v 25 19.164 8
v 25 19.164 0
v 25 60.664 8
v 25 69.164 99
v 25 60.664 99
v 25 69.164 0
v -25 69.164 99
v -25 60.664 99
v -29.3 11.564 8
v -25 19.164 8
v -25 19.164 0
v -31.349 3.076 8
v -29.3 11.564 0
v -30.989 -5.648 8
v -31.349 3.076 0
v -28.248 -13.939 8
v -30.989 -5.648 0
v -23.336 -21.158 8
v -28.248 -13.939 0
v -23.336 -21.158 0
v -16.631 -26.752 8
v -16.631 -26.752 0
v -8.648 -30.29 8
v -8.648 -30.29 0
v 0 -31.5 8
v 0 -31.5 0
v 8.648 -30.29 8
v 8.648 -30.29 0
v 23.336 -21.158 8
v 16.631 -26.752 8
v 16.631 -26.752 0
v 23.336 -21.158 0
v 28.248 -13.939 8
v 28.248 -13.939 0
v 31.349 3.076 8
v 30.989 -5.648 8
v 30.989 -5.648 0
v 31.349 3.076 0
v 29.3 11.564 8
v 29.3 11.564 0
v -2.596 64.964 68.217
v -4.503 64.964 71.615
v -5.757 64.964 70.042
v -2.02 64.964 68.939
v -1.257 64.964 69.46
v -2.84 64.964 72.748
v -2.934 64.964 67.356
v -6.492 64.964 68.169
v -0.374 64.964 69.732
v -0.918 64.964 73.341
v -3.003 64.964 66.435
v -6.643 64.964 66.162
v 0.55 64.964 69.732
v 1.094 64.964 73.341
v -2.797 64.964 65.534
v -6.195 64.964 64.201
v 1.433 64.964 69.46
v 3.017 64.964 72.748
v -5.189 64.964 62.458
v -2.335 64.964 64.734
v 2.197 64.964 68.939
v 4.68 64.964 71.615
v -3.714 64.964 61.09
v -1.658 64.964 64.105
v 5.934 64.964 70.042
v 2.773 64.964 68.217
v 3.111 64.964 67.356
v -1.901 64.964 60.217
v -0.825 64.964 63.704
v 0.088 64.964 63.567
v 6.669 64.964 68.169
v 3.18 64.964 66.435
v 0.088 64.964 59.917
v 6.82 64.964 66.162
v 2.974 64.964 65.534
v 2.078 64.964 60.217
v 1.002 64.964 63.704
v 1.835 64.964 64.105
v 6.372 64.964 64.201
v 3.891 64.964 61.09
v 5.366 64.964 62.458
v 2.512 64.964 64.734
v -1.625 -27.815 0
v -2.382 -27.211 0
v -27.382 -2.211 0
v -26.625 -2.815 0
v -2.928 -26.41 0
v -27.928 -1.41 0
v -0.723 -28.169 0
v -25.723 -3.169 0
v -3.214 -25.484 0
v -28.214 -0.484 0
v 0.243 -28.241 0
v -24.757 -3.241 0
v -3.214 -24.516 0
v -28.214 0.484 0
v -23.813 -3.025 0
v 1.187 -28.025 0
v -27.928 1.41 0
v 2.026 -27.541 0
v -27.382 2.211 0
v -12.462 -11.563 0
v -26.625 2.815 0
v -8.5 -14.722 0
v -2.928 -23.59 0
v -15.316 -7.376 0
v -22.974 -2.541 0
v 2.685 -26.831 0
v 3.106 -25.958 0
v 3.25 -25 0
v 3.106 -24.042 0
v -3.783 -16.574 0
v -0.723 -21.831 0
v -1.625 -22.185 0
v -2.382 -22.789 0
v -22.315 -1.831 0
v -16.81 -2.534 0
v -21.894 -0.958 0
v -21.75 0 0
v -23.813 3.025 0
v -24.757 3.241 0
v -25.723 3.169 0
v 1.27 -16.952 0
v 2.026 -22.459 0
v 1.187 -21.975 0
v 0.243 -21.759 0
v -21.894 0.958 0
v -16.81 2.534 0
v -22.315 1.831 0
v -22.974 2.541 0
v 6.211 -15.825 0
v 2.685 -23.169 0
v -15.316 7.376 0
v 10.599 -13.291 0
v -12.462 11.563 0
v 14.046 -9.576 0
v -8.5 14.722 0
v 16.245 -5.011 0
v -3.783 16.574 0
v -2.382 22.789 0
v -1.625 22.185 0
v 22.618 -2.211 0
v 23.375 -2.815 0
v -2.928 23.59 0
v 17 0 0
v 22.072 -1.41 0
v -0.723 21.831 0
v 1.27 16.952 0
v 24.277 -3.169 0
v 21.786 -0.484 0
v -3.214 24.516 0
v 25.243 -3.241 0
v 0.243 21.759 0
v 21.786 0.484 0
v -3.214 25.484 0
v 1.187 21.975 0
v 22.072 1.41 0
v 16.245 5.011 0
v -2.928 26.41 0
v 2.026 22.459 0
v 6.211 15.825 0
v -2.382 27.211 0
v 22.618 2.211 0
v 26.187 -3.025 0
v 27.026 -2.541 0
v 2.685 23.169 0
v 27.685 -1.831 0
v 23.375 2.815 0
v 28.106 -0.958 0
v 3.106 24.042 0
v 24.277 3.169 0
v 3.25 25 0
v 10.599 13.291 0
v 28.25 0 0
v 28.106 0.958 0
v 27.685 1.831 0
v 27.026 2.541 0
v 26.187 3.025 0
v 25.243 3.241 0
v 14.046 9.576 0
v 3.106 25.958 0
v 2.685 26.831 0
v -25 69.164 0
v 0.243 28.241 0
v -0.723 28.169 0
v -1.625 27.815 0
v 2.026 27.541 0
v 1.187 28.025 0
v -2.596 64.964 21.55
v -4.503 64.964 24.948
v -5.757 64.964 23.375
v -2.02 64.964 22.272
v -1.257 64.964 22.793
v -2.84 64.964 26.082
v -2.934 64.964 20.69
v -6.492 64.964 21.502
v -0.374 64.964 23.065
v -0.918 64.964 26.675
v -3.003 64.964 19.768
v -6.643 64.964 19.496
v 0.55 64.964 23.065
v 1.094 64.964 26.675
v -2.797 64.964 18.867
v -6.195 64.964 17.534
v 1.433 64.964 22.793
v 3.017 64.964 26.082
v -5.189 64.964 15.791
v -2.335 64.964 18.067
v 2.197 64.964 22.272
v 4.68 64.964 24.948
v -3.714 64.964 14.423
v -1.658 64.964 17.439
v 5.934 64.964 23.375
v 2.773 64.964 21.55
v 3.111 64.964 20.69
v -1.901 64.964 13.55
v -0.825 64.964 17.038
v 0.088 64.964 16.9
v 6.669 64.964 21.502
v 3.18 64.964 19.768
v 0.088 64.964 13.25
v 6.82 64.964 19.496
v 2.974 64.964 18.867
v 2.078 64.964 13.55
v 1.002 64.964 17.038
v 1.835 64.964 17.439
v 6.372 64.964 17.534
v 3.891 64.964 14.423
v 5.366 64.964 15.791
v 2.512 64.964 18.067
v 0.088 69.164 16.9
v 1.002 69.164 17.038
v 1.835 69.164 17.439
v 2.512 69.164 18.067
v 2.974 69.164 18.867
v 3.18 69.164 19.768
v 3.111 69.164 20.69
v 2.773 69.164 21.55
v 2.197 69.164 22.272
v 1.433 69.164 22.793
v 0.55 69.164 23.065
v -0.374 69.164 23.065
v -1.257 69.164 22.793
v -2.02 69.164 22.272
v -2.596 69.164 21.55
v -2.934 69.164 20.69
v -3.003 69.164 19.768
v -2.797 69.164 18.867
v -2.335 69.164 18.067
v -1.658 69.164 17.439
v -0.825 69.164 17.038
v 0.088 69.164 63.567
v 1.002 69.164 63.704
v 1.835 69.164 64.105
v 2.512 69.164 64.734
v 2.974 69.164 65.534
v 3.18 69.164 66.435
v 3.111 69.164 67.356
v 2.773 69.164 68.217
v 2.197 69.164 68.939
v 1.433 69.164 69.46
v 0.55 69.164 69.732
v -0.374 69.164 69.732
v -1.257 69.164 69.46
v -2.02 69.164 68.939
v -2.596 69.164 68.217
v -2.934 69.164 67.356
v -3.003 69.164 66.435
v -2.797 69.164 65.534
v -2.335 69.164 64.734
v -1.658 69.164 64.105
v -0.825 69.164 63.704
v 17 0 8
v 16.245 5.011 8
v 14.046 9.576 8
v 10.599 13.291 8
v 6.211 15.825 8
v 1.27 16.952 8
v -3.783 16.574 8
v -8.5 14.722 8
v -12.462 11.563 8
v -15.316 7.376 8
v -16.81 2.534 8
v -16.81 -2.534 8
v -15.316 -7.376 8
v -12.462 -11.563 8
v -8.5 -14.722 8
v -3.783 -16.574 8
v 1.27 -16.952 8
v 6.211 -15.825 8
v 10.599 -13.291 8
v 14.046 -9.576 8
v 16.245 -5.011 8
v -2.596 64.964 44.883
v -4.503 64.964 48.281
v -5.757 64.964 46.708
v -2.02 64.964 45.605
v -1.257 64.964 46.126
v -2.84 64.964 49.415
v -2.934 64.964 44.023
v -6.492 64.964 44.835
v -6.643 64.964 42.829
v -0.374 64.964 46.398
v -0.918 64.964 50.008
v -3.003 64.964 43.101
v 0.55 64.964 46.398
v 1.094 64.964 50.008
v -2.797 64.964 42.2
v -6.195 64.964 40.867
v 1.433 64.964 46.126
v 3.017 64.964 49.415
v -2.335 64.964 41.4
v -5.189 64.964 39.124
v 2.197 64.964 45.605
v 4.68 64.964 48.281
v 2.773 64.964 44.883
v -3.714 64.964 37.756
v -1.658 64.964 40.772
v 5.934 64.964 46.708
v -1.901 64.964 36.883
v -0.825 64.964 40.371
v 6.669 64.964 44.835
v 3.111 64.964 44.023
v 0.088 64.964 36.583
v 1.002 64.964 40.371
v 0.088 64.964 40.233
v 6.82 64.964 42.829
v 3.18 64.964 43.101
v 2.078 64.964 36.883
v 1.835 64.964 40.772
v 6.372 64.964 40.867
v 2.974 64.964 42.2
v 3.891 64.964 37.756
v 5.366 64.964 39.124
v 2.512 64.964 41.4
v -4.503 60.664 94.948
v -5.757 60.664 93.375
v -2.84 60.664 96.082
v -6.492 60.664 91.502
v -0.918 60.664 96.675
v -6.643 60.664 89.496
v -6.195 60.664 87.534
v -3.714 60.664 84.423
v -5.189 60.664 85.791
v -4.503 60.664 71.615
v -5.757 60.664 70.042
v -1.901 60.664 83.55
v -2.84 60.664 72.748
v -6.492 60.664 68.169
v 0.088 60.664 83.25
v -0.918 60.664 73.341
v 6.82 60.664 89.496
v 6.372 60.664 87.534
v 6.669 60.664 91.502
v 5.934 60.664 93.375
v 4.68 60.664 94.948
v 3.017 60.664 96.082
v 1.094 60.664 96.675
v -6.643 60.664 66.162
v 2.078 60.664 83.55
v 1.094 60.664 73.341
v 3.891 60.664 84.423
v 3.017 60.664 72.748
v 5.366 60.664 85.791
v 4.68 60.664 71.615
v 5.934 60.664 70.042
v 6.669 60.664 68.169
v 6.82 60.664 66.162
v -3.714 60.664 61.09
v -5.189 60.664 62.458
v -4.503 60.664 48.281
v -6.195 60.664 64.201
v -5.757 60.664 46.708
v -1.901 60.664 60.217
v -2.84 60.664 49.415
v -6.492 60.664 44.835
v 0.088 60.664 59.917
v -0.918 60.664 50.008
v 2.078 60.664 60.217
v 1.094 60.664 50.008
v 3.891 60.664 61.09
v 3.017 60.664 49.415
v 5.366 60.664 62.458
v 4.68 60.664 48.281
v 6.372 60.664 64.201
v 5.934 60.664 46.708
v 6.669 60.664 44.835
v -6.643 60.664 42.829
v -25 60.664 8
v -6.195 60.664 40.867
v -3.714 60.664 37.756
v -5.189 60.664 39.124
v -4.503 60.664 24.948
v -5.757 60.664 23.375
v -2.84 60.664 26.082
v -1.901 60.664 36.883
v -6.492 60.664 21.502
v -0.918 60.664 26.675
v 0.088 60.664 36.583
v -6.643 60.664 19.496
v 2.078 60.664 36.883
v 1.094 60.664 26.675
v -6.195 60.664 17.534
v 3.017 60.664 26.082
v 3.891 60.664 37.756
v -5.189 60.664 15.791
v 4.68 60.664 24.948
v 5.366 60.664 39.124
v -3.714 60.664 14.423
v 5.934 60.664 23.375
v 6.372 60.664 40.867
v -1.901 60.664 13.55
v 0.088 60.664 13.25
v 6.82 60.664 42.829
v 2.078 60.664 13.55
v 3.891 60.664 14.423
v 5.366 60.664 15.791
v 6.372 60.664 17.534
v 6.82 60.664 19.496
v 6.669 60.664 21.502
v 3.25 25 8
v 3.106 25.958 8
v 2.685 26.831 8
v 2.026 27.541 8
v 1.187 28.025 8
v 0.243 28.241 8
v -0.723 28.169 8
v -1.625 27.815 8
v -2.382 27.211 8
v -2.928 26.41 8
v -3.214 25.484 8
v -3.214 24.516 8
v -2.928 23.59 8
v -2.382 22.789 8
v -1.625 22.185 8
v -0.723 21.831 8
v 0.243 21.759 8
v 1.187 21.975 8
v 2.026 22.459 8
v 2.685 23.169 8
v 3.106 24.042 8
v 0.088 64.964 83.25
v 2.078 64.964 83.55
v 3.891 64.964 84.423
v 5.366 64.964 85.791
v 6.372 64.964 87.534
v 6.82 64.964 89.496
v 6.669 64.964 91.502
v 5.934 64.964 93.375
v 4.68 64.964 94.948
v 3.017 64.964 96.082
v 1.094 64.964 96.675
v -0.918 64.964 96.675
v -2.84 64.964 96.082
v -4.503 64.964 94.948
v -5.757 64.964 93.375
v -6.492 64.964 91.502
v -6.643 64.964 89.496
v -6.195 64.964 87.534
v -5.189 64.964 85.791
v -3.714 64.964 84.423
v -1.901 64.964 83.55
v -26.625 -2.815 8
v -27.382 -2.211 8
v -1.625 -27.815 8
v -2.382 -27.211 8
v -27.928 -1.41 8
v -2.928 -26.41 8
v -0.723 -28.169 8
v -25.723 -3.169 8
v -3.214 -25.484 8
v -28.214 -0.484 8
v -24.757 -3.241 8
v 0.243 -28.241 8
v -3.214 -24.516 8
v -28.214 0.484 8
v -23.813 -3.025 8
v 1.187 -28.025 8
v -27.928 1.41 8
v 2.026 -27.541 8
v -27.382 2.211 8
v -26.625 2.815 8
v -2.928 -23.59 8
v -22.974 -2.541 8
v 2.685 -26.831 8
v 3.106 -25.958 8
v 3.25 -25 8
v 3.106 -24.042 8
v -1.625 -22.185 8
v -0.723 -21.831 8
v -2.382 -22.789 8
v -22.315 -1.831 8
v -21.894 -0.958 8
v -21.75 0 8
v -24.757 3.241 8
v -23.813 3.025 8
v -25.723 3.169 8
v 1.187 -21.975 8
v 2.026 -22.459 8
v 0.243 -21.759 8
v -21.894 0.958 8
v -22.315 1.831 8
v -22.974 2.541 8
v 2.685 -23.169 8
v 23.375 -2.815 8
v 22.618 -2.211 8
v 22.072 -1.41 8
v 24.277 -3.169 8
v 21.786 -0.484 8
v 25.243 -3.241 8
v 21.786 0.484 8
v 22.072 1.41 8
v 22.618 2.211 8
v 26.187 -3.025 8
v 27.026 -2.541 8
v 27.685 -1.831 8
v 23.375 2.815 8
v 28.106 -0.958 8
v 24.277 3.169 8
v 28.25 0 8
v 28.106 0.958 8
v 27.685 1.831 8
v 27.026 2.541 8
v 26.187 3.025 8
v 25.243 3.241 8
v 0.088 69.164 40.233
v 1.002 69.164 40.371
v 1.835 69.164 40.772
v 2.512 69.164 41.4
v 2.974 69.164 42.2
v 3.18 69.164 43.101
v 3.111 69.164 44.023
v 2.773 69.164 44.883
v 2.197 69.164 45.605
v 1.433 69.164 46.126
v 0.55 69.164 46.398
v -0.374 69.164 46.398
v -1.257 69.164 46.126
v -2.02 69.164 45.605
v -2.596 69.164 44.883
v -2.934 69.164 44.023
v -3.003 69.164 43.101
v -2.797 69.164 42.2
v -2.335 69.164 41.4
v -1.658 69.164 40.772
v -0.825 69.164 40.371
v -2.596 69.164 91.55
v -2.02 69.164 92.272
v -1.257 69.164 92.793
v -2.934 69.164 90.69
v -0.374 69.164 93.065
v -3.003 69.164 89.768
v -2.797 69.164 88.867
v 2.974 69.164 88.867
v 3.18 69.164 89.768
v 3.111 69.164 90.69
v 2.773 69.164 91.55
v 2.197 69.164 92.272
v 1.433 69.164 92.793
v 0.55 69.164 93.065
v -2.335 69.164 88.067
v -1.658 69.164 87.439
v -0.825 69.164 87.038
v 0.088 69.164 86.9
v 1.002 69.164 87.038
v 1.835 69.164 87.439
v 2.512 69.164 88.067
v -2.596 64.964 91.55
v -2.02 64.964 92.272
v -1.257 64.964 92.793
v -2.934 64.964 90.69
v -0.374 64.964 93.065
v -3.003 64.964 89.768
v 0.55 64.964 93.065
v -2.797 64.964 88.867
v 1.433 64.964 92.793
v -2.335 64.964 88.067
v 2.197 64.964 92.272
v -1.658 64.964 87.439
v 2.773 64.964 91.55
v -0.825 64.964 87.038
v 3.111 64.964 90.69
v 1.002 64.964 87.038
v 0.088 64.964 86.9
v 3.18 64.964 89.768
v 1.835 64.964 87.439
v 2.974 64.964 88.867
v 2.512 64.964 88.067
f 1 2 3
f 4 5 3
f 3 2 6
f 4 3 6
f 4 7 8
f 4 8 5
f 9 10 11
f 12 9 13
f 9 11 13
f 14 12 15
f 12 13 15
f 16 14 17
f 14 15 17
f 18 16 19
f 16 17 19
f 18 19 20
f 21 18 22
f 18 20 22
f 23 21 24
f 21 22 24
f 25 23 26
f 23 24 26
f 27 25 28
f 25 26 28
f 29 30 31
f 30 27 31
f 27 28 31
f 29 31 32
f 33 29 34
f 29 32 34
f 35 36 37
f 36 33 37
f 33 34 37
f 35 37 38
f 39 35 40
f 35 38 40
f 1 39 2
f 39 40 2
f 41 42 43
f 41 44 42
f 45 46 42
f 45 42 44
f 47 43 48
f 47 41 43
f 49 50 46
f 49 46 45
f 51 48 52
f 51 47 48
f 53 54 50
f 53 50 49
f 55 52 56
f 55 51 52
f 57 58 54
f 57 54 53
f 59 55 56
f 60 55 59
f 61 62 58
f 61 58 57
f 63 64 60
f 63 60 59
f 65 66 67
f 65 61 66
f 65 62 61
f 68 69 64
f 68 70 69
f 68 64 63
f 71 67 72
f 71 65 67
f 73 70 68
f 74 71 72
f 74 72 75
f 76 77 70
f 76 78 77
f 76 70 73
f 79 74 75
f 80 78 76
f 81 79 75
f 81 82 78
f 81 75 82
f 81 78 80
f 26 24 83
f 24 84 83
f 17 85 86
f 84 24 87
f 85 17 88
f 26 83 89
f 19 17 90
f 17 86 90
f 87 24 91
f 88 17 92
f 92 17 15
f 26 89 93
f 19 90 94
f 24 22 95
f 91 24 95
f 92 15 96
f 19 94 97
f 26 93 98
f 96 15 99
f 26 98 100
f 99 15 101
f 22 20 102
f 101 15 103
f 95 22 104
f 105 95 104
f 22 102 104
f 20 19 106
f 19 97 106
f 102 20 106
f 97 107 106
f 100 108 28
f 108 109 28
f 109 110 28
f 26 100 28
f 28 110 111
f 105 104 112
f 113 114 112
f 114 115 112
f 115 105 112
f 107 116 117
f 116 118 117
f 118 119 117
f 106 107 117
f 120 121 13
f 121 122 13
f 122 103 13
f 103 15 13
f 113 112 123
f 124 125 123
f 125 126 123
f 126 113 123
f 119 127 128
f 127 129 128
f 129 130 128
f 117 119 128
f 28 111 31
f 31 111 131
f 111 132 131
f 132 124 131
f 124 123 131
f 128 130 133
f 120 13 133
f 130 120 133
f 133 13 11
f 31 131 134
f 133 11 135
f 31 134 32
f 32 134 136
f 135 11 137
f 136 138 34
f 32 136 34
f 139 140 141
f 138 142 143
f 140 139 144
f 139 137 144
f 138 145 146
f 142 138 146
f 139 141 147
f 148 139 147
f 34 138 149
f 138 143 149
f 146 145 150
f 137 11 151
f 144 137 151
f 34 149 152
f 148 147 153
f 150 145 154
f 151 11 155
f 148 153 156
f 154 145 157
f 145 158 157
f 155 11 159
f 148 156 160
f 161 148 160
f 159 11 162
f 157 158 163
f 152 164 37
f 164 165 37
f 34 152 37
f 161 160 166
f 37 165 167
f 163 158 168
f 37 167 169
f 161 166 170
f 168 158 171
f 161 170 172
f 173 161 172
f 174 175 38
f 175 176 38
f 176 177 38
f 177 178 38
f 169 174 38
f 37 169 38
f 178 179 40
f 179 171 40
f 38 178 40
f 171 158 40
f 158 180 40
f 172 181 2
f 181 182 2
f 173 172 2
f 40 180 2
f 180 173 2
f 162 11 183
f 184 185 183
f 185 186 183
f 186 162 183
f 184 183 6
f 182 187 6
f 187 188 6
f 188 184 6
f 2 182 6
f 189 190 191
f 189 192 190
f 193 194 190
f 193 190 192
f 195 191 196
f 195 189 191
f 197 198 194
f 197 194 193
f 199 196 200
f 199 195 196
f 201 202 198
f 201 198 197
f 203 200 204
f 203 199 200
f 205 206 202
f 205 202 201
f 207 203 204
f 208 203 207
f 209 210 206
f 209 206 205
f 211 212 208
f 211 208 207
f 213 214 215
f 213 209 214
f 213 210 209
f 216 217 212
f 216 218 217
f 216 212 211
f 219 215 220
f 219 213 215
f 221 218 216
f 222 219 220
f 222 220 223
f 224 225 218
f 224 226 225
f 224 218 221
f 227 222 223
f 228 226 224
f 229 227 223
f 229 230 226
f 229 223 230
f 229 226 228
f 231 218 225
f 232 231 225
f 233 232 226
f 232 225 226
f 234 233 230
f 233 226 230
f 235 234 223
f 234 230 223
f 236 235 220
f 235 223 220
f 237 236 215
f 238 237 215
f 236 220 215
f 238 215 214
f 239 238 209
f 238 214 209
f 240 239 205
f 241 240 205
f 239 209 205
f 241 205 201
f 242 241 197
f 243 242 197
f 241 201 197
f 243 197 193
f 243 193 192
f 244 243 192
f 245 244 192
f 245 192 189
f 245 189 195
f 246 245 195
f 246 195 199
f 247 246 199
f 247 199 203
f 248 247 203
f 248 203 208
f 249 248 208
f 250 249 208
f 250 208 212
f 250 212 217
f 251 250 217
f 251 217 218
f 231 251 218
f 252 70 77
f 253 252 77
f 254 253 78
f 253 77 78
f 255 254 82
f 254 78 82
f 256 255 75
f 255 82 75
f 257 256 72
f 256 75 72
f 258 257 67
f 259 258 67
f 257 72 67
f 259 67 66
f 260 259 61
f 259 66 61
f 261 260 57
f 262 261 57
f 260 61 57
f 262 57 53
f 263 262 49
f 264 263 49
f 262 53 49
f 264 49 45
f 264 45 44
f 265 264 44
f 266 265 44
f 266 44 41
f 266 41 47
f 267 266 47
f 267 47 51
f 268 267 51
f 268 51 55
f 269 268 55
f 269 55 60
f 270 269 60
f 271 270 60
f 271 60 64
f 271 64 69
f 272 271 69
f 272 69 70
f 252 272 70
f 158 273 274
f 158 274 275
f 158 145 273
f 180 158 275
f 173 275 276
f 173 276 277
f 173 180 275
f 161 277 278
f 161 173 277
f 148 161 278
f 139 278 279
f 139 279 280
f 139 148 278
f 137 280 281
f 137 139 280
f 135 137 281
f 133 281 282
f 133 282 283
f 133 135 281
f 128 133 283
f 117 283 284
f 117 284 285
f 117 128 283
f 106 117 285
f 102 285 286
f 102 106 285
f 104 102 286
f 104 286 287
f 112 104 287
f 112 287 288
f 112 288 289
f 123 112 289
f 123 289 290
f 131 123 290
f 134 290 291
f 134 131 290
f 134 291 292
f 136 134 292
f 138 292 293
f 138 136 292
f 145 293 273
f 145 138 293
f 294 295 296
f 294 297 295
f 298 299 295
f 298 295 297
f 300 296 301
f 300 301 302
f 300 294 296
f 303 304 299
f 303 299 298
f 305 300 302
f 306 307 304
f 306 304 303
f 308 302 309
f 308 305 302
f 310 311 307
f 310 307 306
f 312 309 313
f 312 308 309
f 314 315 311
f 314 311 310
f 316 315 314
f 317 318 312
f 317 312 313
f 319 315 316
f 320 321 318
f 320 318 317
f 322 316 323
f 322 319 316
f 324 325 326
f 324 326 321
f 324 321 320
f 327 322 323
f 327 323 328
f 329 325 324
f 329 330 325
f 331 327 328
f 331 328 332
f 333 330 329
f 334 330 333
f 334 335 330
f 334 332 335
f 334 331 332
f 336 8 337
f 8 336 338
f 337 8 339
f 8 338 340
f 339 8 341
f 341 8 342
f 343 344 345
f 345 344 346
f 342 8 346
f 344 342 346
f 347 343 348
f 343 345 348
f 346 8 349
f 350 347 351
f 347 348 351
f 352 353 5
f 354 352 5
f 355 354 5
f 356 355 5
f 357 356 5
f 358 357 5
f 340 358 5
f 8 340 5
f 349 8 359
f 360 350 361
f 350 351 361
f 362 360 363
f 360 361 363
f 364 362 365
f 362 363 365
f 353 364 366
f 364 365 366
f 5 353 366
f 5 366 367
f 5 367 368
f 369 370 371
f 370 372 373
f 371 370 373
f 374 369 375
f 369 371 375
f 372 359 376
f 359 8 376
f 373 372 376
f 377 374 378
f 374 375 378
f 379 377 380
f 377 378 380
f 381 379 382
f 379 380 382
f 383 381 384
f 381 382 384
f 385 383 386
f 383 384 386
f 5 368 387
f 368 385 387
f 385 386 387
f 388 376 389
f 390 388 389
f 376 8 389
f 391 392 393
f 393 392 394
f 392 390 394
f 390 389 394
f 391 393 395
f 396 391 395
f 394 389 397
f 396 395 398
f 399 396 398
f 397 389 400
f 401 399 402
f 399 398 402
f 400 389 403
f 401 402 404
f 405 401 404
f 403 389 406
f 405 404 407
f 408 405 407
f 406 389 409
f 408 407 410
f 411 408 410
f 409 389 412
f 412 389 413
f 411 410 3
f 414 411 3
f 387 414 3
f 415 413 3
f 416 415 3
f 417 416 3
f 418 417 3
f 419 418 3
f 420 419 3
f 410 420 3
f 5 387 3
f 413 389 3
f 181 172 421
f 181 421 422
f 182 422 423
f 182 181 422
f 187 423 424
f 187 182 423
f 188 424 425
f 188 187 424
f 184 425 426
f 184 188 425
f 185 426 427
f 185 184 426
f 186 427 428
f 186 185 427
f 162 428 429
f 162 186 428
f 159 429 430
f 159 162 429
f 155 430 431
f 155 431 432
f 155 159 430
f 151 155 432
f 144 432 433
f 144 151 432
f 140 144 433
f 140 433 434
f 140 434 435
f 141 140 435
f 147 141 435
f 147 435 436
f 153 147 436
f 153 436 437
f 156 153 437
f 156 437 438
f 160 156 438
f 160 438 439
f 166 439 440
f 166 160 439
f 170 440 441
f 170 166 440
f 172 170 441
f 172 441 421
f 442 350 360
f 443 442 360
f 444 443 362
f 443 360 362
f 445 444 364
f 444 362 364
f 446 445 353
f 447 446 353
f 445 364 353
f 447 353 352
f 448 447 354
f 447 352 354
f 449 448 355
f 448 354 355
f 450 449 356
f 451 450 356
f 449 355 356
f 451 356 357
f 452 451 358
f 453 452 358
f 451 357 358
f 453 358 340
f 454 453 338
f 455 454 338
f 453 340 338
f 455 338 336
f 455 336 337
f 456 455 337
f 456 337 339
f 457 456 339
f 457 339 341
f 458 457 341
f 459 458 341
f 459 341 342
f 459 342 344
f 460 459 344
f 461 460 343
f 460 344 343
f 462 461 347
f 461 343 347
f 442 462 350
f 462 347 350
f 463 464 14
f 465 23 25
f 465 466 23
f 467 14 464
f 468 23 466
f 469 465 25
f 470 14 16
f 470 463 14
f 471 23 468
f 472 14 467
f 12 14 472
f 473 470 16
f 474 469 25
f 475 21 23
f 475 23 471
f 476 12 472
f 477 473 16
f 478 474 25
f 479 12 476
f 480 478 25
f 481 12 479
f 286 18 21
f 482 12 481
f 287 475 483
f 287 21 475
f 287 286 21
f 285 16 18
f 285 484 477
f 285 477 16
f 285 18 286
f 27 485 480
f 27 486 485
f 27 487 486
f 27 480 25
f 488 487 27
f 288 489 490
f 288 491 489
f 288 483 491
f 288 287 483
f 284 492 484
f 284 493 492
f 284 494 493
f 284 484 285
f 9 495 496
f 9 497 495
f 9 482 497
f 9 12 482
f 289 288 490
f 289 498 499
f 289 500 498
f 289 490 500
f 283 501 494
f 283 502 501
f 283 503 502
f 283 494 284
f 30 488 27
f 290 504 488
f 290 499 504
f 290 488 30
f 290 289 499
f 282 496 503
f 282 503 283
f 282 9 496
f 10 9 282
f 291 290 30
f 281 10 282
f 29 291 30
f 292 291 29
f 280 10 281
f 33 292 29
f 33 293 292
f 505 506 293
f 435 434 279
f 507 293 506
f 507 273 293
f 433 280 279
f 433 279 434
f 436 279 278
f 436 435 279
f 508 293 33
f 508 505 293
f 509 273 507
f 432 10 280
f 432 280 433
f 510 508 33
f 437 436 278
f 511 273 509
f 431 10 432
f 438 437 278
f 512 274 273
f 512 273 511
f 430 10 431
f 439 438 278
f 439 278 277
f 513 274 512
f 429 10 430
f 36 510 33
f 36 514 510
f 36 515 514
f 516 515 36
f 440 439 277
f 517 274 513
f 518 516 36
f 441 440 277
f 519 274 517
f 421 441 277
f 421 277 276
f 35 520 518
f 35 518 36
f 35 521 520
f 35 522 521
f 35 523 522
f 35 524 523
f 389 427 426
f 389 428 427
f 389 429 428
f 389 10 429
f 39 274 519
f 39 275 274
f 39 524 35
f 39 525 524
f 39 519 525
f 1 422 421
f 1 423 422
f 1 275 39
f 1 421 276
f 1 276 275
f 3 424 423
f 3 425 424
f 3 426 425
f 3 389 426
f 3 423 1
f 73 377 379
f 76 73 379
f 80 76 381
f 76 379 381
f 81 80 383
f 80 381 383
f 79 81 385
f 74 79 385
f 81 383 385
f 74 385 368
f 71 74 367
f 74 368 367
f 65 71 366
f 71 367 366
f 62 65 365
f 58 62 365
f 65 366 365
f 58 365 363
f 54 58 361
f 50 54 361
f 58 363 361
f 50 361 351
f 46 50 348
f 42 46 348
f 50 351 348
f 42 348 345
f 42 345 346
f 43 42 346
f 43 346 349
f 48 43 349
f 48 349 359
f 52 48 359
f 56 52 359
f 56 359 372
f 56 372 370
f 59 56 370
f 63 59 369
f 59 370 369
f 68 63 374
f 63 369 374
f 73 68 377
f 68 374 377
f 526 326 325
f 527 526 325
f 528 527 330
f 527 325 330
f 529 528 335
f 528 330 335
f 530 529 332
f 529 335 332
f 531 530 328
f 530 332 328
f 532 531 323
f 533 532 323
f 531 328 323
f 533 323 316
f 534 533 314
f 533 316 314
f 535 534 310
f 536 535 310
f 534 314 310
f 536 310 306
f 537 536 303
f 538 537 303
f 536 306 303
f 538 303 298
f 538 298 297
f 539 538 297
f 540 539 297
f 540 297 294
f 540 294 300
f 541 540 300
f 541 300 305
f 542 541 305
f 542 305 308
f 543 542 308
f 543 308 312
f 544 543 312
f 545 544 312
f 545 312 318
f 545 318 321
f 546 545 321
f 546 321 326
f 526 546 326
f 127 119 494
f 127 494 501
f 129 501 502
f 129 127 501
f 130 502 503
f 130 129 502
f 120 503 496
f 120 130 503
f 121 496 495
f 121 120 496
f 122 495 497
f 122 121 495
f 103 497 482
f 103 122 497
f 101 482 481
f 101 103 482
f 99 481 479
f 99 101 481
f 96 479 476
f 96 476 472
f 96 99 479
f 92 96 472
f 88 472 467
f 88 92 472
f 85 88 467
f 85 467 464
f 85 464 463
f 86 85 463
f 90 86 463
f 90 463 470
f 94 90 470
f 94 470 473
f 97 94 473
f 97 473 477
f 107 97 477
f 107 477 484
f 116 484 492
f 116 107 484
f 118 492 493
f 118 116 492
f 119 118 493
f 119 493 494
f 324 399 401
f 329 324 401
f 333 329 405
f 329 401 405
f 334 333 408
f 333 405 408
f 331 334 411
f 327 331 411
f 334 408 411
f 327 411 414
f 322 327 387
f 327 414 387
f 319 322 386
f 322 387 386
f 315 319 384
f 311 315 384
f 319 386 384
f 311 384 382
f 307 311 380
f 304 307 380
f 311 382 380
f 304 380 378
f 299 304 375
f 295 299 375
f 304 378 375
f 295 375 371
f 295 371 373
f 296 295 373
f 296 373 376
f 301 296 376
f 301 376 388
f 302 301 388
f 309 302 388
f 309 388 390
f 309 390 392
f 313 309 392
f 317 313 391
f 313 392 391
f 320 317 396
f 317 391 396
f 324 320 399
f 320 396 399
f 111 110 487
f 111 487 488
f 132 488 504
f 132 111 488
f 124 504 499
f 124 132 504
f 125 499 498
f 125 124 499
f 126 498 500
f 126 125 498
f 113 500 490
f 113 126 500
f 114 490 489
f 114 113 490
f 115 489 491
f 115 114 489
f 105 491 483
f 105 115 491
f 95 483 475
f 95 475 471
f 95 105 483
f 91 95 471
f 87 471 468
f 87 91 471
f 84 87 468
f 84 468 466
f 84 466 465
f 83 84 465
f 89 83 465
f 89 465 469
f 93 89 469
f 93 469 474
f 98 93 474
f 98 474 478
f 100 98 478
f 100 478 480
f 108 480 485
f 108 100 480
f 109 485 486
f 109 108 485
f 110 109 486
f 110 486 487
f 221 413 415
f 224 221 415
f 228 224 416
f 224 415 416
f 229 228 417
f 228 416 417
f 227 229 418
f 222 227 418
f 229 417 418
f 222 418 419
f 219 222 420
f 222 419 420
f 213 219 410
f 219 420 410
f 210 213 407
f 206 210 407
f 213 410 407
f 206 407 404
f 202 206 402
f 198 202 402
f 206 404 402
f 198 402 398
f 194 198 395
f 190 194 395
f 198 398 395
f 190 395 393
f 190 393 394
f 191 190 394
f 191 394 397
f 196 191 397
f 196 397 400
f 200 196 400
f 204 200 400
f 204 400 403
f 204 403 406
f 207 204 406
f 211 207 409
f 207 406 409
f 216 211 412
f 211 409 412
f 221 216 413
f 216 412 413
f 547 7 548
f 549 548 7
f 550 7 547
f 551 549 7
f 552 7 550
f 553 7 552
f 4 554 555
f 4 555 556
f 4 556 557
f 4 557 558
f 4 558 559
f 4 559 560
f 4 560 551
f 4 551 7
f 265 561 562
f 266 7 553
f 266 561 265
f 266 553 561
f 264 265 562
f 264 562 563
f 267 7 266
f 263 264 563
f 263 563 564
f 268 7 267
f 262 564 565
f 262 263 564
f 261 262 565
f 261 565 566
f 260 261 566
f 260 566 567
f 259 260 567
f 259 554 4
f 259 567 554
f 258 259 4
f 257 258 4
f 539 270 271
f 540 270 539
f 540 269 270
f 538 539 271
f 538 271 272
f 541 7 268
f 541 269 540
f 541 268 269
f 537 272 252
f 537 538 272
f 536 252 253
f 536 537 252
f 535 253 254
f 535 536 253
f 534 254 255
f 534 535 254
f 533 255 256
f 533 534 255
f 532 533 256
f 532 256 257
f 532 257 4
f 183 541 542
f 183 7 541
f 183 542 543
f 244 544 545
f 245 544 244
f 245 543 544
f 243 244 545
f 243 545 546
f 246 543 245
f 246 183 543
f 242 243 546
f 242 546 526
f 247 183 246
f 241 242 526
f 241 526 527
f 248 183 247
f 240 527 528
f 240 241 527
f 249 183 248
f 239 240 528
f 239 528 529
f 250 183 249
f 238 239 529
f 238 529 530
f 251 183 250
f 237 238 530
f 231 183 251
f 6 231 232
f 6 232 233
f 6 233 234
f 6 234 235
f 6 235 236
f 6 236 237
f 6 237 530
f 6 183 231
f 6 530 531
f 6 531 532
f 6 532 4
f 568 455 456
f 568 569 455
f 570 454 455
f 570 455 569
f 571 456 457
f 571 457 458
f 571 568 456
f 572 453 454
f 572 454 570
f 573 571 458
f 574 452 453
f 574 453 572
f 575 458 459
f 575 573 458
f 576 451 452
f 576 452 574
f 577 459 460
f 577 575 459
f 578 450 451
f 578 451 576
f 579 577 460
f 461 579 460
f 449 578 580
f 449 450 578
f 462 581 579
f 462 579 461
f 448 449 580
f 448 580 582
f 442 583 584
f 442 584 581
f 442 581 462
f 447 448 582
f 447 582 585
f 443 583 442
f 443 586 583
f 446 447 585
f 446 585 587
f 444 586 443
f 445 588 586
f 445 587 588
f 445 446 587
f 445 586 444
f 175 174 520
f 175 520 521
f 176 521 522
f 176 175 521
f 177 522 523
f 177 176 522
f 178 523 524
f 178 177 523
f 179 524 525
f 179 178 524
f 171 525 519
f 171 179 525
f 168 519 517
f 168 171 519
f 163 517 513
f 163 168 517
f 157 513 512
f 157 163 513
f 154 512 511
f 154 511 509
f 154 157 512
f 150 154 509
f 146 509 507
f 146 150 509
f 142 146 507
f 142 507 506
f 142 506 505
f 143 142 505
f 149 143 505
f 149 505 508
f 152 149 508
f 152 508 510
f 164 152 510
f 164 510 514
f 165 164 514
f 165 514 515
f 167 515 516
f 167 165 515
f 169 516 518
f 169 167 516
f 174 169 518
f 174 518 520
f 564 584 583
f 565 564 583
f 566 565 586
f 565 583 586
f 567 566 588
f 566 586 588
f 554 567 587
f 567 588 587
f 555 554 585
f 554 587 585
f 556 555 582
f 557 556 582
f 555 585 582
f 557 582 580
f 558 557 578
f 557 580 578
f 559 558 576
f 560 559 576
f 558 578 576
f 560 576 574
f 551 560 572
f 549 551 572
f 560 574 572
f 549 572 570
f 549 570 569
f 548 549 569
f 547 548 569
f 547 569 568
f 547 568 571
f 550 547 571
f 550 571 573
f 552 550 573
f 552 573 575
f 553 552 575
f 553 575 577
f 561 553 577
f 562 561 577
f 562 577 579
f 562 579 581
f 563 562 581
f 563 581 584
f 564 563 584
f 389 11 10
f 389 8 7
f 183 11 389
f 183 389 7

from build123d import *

# Parameters (mm, degrees)
SKETCH_1_R          = 31.5
EXTRUDE_1_DEPTH     = 8
SKETCH_1_3_R        = 3.25
CUT_EXTRUDE_1_DEPTH = 8
SKETCH_1_4_R        = 17
CUT_EXTRUDE_2_DEPTH = 6
EXTRUDE_2_DEPTH     = 4
SKETCH_4_W          = 50
SKETCH_4_H          = 8.5
EXTRUDE_3_DEPTH     = 95
SKETCH_5_R          = 3.1
CUT_EXTRUDE_3_DEPTH = 10
SKETCH_5_3_R        = 6.75
SKETCH_5_3_R_2      = 3.1
CUT_EXTRUDE_4_DEPTH = 4.3
EXTRUDE_4_DEPTH     = 8
SKETCH_1_8_R        = 17
CUT_EXTRUDE_5_DEPTH = 8


with BuildPart() as part:
    # 草图1 → 凸台-拉伸1 (new body)
    with BuildSketch(Plane.XY):
        Circle(SKETCH_1_R)
    extrude(amount=EXTRUDE_1_DEPTH)

    # 草图1<3> → 切除-拉伸1 (cut)
    with BuildSketch(Plane.XY):
        with Locations((0, 25)):
            Circle(SKETCH_1_3_R)
        with Locations((-25, 0)):
            Circle(SKETCH_1_3_R)
        with Locations((25, 0)):
            Circle(SKETCH_1_3_R)
        with Locations((0, -25)):
            Circle(SKETCH_1_3_R)
    extrude(amount=CUT_EXTRUDE_1_DEPTH, mode=Mode.SUBTRACT)

    # 草图1<4> → 切除-拉伸2 (cut)
    with BuildSketch(Plane.XY):
        Circle(SKETCH_1_4_R)
    extrude(amount=CUT_EXTRUDE_2_DEPTH, mode=Mode.SUBTRACT)

    # 草图1<5> → 凸台-拉伸2 (add)
    with BuildSketch(Plane.XY):
        with BuildLine():
            Line((25, 69.163767897), (17.863752341, 69.163767897))
            Line((17.863752341, 69.163767897), (-25, 69.163767897))
            Line((-25, 69.163767897), (-25, 28.735067362))
            Line((-25, 28.735067362), (-25, 19.163767897))
            ThreePointArc((-25, 19.163767897), (0, 31.5), (25, 19.163767897))
            Line((25, 19.163767897), (25, 69.163767897))
        make_face()
    extrude(amount=EXTRUDE_2_DEPTH)

    # 草图4 → 凸台-拉伸3 (add)
    with BuildSketch(Plane.XY.offset(4)):
        with Locations((0, 64.913767897)):
            Rectangle(SKETCH_4_W, SKETCH_4_H)
    extrude(amount=EXTRUDE_3_DEPTH)

    # 草图5 → 切除-拉伸3 (cut)
    with BuildSketch(Plane.XZ.offset(-60.663767897)):
        with Locations((0.088398714, 90)):
            Circle(SKETCH_5_R)
        with Locations((0.088398714, 20)):
            Circle(SKETCH_5_R)
        with Locations((0.088398714, 43.333)):
            Circle(SKETCH_5_R)
        with Locations((0.088398714, 66.66667)):
            Circle(SKETCH_5_R)
    extrude(amount=-CUT_EXTRUDE_3_DEPTH, mode=Mode.SUBTRACT)

    # 草图5<3> → 切除-拉伸4 (cut)
    # profile 1 of 4: a face of its own
    with BuildSketch(Plane.XZ.offset(-60.663767897)):
        with Locations((0.088398714, 90)):
            Circle(SKETCH_5_3_R)
    # profile 2 of 4: a face of its own
    with BuildSketch(Plane.XZ.offset(-60.663767897)):
        with Locations((0.088398714, 20)):
            Circle(SKETCH_5_3_R)
        with Locations((0.088398714, 20)):
            Circle(SKETCH_5_3_R_2, mode=Mode.SUBTRACT)
    # profile 3 of 4: a face of its own
    with BuildSketch(Plane.XZ.offset(-60.663767897)):
        with Locations((0.088398714, 43.333)):
            Circle(SKETCH_5_3_R)
        with Locations((0.088398714, 43.333)):
            Circle(SKETCH_5_3_R_2, mode=Mode.SUBTRACT)
    # profile 4 of 4: a face of its own
    with BuildSketch(Plane.XZ.offset(-60.663767897)):
        with Locations((0.088398714, 66.66667)):
            Circle(SKETCH_5_3_R)
        with Locations((0.088398714, 66.66667)):
            Circle(SKETCH_5_3_R_2, mode=Mode.SUBTRACT)
    extrude(amount=-CUT_EXTRUDE_4_DEPTH, mode=Mode.SUBTRACT)

    # 草图1<7> → 凸台-拉伸4 (add)
    with BuildSketch(Plane.XY):
        with BuildLine():
            Line((25, 69.163767897), (17.863752341, 69.163767897))
            Line((17.863752341, 69.163767897), (-25, 69.163767897))
            Line((-25, 69.163767897), (-25, 28.735067362))
            Line((-25, 28.735067362), (-25, 19.163767897))
            ThreePointArc((-25, 19.163767897), (0, 31.5), (25, 19.163767897))
            Line((25, 19.163767897), (25, 69.163767897))
        make_face()
    extrude(amount=EXTRUDE_4_DEPTH)

    # 草图1<8> → 切除-拉伸5 (cut)
    with BuildSketch(Plane.XY):
        Circle(SKETCH_1_8_R)
    extrude(amount=CUT_EXTRUDE_5_DEPTH, mode=Mode.SUBTRACT)


solid = part.part
